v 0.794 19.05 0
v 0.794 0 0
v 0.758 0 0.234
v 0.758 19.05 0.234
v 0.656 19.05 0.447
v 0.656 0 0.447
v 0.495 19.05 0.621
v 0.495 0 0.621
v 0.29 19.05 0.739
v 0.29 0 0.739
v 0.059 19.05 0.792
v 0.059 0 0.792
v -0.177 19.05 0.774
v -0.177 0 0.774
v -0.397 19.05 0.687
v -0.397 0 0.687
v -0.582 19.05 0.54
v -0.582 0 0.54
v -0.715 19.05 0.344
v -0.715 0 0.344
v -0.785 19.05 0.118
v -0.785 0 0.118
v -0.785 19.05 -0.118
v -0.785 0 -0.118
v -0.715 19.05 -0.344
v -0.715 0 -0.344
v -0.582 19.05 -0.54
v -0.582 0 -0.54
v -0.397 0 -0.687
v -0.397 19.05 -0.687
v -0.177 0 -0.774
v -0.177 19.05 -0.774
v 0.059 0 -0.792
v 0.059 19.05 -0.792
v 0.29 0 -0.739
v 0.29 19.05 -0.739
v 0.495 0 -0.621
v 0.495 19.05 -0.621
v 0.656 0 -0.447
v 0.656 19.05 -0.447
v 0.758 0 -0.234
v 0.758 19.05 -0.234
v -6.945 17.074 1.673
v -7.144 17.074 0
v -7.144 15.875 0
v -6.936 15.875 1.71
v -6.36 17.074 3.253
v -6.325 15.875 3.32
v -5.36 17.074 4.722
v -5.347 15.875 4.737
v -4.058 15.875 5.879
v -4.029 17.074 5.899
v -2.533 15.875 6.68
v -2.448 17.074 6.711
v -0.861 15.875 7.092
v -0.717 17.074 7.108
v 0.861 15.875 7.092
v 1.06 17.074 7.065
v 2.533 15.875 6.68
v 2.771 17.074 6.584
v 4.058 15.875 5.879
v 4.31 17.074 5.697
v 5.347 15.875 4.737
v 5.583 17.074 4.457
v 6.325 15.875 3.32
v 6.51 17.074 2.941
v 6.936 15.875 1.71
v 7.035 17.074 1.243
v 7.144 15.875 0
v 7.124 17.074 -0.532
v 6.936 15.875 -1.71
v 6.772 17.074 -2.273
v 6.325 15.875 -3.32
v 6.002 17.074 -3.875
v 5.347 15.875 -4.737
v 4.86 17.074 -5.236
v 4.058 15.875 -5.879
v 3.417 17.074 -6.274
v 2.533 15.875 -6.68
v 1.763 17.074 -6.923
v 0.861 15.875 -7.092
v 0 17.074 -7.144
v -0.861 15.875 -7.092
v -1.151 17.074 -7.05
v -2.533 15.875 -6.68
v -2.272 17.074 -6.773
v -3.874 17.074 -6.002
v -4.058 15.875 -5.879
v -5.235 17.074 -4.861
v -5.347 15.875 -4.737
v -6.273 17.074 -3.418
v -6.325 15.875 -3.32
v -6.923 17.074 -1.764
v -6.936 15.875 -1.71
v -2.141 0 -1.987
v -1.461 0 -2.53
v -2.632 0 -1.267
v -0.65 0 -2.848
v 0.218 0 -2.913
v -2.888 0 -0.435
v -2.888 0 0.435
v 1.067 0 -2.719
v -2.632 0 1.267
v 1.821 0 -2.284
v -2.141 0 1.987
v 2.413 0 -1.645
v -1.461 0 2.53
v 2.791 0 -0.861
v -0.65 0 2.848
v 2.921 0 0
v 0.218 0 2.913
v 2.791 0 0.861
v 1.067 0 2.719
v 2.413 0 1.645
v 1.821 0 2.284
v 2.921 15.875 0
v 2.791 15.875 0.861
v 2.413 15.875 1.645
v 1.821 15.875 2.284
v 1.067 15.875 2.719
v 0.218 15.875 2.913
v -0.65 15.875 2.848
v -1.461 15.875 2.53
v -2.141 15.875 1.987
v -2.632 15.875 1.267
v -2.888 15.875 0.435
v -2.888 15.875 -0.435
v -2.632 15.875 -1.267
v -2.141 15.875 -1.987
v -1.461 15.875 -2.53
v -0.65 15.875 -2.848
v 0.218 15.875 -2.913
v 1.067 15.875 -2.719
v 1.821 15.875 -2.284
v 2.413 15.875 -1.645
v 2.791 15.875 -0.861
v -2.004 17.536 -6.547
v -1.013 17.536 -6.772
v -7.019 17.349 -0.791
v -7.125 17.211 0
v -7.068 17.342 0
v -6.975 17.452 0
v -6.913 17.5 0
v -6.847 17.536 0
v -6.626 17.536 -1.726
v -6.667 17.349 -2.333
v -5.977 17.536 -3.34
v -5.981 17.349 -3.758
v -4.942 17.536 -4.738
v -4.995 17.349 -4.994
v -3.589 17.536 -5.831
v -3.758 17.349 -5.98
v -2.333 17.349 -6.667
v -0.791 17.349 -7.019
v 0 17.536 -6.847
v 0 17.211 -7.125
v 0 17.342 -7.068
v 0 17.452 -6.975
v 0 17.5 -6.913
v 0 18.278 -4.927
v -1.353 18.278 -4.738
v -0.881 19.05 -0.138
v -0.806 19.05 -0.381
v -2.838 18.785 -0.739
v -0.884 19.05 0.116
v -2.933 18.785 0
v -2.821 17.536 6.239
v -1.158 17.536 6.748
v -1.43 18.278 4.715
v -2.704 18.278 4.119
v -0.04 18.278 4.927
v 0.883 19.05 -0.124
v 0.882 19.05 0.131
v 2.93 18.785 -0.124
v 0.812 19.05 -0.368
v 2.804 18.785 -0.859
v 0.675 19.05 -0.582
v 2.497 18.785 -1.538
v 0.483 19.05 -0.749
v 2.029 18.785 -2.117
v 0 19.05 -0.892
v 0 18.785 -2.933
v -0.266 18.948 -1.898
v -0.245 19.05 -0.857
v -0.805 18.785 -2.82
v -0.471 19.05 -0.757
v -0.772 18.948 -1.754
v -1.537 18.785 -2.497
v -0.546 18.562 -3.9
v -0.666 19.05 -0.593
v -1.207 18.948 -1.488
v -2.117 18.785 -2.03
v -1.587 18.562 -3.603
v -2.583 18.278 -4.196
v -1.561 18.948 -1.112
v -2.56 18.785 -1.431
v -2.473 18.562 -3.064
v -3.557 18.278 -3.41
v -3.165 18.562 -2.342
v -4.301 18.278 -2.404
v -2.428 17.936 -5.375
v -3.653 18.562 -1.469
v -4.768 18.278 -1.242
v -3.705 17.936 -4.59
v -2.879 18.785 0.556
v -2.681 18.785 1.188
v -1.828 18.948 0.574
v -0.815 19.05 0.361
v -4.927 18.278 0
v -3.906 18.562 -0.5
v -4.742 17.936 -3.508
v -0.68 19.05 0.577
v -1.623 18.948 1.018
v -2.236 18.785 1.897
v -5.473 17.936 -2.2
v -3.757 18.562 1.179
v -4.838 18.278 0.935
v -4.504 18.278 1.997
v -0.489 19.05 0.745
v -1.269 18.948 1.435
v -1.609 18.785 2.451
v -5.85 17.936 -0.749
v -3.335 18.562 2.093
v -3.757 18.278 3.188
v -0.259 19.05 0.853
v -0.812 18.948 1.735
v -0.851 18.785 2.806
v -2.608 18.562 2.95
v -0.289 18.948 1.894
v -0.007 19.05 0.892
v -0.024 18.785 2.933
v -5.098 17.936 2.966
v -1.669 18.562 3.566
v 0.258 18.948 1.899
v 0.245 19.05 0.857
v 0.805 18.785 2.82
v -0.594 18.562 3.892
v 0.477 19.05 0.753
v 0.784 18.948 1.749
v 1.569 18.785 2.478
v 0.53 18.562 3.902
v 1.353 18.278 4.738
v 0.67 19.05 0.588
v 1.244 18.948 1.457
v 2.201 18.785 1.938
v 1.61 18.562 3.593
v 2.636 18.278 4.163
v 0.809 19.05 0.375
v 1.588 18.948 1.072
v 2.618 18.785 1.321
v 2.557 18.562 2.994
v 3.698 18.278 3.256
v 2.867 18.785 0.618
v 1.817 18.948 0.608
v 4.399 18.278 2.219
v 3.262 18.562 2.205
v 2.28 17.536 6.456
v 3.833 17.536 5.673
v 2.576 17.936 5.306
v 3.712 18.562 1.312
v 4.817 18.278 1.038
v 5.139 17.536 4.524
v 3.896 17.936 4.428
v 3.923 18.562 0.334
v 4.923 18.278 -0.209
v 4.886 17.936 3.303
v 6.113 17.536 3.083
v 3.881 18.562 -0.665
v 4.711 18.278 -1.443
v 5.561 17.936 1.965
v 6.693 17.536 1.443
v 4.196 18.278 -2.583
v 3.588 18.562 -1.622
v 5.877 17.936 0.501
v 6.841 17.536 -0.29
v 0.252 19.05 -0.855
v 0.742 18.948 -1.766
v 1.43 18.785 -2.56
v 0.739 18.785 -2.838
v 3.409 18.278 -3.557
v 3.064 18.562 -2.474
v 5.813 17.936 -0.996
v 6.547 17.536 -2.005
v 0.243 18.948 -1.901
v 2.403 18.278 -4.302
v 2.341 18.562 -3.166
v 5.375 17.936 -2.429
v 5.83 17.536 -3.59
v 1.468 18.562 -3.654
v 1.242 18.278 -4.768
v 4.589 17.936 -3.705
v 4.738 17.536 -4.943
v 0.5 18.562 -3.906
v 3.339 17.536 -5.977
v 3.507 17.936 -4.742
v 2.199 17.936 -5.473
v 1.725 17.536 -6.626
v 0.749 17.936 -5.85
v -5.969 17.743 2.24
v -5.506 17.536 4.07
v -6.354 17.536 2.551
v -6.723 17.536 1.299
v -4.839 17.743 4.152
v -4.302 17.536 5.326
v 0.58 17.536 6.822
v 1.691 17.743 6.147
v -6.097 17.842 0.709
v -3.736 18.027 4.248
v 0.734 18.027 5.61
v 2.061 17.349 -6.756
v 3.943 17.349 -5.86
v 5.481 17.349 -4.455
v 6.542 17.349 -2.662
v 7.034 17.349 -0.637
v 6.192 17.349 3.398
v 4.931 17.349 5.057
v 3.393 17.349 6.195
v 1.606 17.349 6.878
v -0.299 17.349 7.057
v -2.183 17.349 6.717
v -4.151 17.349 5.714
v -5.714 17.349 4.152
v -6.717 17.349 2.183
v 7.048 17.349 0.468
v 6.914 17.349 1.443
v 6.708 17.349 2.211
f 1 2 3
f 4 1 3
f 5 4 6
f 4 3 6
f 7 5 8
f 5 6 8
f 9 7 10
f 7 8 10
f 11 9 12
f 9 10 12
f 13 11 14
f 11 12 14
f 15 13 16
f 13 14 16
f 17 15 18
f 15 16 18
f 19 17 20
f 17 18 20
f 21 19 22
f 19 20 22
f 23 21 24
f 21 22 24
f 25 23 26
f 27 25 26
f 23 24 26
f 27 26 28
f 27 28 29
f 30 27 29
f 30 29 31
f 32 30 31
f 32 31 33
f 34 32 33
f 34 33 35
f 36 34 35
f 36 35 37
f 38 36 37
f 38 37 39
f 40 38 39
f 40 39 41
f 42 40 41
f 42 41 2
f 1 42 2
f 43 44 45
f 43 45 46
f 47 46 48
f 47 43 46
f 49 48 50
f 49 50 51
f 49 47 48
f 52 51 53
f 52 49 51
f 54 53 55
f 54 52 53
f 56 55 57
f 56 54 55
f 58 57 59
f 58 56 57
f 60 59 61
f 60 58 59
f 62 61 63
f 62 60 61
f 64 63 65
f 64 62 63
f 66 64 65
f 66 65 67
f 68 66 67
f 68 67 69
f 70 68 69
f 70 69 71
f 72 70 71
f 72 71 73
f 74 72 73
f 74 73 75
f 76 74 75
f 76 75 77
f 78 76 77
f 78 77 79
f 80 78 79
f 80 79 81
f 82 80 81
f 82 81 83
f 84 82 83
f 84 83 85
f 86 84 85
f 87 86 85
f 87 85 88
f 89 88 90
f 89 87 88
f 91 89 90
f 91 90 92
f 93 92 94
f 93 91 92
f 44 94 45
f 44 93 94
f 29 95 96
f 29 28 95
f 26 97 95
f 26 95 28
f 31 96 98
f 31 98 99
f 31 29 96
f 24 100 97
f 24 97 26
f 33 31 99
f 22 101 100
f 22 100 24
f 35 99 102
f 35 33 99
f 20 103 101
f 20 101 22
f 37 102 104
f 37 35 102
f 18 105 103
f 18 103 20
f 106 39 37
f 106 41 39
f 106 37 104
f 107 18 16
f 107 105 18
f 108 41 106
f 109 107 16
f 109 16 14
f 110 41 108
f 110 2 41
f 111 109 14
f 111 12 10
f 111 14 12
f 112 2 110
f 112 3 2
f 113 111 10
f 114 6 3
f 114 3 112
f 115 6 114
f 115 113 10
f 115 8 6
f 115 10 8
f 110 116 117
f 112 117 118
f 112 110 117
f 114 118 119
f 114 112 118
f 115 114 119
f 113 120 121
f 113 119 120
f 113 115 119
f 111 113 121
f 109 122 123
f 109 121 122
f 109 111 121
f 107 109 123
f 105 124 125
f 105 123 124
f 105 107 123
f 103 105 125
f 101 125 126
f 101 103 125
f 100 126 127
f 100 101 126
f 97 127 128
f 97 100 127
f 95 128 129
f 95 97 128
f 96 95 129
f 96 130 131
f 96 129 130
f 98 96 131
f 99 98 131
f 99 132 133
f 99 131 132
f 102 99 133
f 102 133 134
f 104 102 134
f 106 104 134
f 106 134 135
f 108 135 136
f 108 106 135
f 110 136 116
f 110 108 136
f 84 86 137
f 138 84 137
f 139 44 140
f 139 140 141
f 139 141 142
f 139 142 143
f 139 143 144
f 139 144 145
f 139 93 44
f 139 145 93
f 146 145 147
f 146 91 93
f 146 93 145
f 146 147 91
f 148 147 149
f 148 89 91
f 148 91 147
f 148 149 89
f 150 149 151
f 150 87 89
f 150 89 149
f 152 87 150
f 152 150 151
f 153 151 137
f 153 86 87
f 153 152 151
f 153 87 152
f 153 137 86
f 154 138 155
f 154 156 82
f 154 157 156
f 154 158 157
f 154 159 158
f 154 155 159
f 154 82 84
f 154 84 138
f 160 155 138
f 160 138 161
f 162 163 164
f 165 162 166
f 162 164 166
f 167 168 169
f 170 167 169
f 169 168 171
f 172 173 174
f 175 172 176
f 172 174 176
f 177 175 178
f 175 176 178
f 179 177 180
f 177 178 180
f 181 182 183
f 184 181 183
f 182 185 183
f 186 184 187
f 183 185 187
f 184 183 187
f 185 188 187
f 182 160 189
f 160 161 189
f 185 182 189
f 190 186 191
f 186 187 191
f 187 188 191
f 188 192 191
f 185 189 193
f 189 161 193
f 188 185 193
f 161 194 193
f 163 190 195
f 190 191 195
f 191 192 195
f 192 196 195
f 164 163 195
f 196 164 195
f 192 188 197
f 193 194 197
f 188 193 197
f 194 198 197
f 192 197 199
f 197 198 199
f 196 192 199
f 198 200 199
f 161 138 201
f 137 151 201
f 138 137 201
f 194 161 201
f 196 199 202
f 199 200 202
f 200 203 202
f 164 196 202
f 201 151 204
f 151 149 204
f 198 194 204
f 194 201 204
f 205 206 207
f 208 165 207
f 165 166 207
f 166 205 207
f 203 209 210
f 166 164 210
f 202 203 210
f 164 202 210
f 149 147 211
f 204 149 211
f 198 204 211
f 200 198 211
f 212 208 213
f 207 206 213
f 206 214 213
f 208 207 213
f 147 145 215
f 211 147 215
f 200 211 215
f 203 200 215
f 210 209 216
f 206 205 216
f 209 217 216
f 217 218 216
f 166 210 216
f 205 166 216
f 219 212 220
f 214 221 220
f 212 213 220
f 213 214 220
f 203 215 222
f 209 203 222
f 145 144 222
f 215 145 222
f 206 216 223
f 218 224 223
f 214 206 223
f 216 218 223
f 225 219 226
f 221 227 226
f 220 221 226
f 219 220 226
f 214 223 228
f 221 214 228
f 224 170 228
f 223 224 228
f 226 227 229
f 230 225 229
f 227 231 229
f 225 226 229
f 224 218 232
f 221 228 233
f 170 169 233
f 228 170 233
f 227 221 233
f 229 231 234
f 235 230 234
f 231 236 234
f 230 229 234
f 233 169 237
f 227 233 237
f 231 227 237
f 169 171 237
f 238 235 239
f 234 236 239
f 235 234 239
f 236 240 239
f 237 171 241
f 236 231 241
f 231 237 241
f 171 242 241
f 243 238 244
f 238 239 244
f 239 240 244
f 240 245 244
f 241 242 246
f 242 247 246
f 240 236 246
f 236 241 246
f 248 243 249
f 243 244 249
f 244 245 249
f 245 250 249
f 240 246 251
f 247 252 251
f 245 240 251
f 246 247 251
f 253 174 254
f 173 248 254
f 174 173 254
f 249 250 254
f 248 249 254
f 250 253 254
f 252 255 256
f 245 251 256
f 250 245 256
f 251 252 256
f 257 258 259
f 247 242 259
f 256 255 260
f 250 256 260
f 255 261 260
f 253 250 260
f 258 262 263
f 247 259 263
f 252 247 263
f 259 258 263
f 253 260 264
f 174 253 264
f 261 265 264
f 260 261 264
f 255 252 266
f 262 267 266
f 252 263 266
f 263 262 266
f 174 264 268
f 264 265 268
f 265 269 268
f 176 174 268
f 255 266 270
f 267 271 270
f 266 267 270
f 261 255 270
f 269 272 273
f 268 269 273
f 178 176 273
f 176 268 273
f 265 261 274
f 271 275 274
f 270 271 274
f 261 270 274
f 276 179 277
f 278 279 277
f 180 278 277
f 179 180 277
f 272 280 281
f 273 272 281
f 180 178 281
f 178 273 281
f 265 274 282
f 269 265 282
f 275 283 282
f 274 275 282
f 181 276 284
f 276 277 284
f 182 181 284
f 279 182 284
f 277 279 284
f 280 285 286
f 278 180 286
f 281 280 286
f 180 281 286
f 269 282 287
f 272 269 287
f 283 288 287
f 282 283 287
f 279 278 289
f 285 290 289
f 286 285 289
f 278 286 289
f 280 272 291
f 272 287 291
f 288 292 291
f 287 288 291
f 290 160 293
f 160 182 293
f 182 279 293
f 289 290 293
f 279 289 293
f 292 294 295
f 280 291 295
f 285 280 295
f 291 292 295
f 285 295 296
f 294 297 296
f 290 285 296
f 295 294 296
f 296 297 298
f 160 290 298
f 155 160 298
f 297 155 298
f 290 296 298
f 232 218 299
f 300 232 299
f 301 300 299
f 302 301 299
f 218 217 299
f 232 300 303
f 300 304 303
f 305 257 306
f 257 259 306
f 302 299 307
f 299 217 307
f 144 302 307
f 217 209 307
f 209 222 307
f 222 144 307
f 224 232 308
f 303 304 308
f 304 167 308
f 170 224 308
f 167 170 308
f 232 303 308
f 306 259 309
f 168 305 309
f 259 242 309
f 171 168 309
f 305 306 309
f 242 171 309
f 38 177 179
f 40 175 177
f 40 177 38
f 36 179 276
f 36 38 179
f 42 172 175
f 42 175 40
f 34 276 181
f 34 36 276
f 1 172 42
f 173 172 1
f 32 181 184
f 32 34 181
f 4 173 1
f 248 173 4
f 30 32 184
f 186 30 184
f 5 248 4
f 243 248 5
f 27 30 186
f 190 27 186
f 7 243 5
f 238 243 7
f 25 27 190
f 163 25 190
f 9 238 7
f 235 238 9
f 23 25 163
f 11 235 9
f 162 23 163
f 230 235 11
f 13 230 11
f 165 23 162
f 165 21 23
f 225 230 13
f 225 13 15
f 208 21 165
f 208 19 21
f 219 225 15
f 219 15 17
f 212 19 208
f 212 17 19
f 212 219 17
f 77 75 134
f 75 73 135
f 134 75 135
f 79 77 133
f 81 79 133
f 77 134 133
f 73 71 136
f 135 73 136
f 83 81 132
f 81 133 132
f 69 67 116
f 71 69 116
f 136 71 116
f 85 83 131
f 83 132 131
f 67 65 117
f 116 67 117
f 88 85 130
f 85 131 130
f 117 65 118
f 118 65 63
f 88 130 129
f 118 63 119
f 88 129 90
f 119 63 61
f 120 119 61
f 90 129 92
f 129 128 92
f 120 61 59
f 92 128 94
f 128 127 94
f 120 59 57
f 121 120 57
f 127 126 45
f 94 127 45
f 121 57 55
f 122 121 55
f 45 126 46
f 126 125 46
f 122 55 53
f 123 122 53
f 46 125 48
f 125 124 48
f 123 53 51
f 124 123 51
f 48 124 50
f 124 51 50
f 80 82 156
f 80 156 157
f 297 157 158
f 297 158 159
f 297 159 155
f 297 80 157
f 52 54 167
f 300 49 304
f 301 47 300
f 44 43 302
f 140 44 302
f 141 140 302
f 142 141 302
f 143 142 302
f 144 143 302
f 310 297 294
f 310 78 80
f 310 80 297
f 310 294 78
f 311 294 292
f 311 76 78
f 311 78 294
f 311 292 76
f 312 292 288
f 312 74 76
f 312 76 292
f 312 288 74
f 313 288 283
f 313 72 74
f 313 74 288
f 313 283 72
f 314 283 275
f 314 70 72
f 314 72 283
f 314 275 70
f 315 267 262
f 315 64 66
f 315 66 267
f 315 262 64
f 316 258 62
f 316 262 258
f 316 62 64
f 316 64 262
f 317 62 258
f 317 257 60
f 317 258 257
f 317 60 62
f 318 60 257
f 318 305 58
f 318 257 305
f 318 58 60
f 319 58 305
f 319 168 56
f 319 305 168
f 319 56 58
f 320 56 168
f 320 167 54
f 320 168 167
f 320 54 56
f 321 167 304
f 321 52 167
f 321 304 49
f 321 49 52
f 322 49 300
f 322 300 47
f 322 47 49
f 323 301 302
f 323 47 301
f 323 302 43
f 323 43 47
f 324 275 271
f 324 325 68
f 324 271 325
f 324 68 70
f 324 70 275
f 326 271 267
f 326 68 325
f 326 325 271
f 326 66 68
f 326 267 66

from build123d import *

# Parameters (mm, degrees)
F0_R     = 2.921
F1_DEPTH = 19.05
F2_R     = 7.14375
F2_R_2   = 2.921
F3_DEPTH = 3.175
F4_R     = 0.79375
F5_DEPTH = 19.051
F8_R     = 0.508


# Not quite as in the source:
# - a feature names something its author has since deleted; it is built from what else it names


with BuildPart() as f1:
    # F0 (on Front) → F1 (new body)
    with BuildSketch(Plane.XZ):
        Circle(F0_R)
    extrude(amount=-F1_DEPTH)

    # F2 (on face) → F3 (join)
    with BuildSketch(Plane(origin=(0, 19.05, 0), x_dir=(-1, 0, 0), z_dir=(0, 1, 0))):
        Circle(F2_R)
        Circle(F2_R_2, mode=Mode.SUBTRACT)
    extrude(amount=-F3_DEPTH)

    # F4 (on face) → F5 (cut, through all)
    with BuildSketch(Plane.XZ):
        Circle(F4_R)
    extrude(amount=-F5_DEPTH, mode=Mode.SUBTRACT)

    # F6 (on Right) → F7 (revolve, cut)
    with BuildSketch(Plane.YZ):
        with BuildLine():
            ThreePointArc((19.0884582698, 0), (18.6124325104, -3.7323455074), (17.335280776, -7.2715384886))
            Line((17.335280776, -7.2715384886), (21.6284582698, -7.2715384886))
            Line((21.6284582698, -7.2715384886), (21.6284582698, 0))
            Line((21.6284582698, 0), (19.0884582698, 0))
        make_face()
    revolve(axis=Axis((0, 12.9899214953, 0), (0, 1, 0)), mode=Mode.SUBTRACT)

    # F8
    f8_edges = [f1.edges().sort_by_distance(p)[0] for p in [
        (5.051394, 17.397311, 5.051394),
        (-5.051394, 17.397311, -5.051394),
    ]]
    fillet(f8_edges, radius=F8_R)


solid = f1.part
